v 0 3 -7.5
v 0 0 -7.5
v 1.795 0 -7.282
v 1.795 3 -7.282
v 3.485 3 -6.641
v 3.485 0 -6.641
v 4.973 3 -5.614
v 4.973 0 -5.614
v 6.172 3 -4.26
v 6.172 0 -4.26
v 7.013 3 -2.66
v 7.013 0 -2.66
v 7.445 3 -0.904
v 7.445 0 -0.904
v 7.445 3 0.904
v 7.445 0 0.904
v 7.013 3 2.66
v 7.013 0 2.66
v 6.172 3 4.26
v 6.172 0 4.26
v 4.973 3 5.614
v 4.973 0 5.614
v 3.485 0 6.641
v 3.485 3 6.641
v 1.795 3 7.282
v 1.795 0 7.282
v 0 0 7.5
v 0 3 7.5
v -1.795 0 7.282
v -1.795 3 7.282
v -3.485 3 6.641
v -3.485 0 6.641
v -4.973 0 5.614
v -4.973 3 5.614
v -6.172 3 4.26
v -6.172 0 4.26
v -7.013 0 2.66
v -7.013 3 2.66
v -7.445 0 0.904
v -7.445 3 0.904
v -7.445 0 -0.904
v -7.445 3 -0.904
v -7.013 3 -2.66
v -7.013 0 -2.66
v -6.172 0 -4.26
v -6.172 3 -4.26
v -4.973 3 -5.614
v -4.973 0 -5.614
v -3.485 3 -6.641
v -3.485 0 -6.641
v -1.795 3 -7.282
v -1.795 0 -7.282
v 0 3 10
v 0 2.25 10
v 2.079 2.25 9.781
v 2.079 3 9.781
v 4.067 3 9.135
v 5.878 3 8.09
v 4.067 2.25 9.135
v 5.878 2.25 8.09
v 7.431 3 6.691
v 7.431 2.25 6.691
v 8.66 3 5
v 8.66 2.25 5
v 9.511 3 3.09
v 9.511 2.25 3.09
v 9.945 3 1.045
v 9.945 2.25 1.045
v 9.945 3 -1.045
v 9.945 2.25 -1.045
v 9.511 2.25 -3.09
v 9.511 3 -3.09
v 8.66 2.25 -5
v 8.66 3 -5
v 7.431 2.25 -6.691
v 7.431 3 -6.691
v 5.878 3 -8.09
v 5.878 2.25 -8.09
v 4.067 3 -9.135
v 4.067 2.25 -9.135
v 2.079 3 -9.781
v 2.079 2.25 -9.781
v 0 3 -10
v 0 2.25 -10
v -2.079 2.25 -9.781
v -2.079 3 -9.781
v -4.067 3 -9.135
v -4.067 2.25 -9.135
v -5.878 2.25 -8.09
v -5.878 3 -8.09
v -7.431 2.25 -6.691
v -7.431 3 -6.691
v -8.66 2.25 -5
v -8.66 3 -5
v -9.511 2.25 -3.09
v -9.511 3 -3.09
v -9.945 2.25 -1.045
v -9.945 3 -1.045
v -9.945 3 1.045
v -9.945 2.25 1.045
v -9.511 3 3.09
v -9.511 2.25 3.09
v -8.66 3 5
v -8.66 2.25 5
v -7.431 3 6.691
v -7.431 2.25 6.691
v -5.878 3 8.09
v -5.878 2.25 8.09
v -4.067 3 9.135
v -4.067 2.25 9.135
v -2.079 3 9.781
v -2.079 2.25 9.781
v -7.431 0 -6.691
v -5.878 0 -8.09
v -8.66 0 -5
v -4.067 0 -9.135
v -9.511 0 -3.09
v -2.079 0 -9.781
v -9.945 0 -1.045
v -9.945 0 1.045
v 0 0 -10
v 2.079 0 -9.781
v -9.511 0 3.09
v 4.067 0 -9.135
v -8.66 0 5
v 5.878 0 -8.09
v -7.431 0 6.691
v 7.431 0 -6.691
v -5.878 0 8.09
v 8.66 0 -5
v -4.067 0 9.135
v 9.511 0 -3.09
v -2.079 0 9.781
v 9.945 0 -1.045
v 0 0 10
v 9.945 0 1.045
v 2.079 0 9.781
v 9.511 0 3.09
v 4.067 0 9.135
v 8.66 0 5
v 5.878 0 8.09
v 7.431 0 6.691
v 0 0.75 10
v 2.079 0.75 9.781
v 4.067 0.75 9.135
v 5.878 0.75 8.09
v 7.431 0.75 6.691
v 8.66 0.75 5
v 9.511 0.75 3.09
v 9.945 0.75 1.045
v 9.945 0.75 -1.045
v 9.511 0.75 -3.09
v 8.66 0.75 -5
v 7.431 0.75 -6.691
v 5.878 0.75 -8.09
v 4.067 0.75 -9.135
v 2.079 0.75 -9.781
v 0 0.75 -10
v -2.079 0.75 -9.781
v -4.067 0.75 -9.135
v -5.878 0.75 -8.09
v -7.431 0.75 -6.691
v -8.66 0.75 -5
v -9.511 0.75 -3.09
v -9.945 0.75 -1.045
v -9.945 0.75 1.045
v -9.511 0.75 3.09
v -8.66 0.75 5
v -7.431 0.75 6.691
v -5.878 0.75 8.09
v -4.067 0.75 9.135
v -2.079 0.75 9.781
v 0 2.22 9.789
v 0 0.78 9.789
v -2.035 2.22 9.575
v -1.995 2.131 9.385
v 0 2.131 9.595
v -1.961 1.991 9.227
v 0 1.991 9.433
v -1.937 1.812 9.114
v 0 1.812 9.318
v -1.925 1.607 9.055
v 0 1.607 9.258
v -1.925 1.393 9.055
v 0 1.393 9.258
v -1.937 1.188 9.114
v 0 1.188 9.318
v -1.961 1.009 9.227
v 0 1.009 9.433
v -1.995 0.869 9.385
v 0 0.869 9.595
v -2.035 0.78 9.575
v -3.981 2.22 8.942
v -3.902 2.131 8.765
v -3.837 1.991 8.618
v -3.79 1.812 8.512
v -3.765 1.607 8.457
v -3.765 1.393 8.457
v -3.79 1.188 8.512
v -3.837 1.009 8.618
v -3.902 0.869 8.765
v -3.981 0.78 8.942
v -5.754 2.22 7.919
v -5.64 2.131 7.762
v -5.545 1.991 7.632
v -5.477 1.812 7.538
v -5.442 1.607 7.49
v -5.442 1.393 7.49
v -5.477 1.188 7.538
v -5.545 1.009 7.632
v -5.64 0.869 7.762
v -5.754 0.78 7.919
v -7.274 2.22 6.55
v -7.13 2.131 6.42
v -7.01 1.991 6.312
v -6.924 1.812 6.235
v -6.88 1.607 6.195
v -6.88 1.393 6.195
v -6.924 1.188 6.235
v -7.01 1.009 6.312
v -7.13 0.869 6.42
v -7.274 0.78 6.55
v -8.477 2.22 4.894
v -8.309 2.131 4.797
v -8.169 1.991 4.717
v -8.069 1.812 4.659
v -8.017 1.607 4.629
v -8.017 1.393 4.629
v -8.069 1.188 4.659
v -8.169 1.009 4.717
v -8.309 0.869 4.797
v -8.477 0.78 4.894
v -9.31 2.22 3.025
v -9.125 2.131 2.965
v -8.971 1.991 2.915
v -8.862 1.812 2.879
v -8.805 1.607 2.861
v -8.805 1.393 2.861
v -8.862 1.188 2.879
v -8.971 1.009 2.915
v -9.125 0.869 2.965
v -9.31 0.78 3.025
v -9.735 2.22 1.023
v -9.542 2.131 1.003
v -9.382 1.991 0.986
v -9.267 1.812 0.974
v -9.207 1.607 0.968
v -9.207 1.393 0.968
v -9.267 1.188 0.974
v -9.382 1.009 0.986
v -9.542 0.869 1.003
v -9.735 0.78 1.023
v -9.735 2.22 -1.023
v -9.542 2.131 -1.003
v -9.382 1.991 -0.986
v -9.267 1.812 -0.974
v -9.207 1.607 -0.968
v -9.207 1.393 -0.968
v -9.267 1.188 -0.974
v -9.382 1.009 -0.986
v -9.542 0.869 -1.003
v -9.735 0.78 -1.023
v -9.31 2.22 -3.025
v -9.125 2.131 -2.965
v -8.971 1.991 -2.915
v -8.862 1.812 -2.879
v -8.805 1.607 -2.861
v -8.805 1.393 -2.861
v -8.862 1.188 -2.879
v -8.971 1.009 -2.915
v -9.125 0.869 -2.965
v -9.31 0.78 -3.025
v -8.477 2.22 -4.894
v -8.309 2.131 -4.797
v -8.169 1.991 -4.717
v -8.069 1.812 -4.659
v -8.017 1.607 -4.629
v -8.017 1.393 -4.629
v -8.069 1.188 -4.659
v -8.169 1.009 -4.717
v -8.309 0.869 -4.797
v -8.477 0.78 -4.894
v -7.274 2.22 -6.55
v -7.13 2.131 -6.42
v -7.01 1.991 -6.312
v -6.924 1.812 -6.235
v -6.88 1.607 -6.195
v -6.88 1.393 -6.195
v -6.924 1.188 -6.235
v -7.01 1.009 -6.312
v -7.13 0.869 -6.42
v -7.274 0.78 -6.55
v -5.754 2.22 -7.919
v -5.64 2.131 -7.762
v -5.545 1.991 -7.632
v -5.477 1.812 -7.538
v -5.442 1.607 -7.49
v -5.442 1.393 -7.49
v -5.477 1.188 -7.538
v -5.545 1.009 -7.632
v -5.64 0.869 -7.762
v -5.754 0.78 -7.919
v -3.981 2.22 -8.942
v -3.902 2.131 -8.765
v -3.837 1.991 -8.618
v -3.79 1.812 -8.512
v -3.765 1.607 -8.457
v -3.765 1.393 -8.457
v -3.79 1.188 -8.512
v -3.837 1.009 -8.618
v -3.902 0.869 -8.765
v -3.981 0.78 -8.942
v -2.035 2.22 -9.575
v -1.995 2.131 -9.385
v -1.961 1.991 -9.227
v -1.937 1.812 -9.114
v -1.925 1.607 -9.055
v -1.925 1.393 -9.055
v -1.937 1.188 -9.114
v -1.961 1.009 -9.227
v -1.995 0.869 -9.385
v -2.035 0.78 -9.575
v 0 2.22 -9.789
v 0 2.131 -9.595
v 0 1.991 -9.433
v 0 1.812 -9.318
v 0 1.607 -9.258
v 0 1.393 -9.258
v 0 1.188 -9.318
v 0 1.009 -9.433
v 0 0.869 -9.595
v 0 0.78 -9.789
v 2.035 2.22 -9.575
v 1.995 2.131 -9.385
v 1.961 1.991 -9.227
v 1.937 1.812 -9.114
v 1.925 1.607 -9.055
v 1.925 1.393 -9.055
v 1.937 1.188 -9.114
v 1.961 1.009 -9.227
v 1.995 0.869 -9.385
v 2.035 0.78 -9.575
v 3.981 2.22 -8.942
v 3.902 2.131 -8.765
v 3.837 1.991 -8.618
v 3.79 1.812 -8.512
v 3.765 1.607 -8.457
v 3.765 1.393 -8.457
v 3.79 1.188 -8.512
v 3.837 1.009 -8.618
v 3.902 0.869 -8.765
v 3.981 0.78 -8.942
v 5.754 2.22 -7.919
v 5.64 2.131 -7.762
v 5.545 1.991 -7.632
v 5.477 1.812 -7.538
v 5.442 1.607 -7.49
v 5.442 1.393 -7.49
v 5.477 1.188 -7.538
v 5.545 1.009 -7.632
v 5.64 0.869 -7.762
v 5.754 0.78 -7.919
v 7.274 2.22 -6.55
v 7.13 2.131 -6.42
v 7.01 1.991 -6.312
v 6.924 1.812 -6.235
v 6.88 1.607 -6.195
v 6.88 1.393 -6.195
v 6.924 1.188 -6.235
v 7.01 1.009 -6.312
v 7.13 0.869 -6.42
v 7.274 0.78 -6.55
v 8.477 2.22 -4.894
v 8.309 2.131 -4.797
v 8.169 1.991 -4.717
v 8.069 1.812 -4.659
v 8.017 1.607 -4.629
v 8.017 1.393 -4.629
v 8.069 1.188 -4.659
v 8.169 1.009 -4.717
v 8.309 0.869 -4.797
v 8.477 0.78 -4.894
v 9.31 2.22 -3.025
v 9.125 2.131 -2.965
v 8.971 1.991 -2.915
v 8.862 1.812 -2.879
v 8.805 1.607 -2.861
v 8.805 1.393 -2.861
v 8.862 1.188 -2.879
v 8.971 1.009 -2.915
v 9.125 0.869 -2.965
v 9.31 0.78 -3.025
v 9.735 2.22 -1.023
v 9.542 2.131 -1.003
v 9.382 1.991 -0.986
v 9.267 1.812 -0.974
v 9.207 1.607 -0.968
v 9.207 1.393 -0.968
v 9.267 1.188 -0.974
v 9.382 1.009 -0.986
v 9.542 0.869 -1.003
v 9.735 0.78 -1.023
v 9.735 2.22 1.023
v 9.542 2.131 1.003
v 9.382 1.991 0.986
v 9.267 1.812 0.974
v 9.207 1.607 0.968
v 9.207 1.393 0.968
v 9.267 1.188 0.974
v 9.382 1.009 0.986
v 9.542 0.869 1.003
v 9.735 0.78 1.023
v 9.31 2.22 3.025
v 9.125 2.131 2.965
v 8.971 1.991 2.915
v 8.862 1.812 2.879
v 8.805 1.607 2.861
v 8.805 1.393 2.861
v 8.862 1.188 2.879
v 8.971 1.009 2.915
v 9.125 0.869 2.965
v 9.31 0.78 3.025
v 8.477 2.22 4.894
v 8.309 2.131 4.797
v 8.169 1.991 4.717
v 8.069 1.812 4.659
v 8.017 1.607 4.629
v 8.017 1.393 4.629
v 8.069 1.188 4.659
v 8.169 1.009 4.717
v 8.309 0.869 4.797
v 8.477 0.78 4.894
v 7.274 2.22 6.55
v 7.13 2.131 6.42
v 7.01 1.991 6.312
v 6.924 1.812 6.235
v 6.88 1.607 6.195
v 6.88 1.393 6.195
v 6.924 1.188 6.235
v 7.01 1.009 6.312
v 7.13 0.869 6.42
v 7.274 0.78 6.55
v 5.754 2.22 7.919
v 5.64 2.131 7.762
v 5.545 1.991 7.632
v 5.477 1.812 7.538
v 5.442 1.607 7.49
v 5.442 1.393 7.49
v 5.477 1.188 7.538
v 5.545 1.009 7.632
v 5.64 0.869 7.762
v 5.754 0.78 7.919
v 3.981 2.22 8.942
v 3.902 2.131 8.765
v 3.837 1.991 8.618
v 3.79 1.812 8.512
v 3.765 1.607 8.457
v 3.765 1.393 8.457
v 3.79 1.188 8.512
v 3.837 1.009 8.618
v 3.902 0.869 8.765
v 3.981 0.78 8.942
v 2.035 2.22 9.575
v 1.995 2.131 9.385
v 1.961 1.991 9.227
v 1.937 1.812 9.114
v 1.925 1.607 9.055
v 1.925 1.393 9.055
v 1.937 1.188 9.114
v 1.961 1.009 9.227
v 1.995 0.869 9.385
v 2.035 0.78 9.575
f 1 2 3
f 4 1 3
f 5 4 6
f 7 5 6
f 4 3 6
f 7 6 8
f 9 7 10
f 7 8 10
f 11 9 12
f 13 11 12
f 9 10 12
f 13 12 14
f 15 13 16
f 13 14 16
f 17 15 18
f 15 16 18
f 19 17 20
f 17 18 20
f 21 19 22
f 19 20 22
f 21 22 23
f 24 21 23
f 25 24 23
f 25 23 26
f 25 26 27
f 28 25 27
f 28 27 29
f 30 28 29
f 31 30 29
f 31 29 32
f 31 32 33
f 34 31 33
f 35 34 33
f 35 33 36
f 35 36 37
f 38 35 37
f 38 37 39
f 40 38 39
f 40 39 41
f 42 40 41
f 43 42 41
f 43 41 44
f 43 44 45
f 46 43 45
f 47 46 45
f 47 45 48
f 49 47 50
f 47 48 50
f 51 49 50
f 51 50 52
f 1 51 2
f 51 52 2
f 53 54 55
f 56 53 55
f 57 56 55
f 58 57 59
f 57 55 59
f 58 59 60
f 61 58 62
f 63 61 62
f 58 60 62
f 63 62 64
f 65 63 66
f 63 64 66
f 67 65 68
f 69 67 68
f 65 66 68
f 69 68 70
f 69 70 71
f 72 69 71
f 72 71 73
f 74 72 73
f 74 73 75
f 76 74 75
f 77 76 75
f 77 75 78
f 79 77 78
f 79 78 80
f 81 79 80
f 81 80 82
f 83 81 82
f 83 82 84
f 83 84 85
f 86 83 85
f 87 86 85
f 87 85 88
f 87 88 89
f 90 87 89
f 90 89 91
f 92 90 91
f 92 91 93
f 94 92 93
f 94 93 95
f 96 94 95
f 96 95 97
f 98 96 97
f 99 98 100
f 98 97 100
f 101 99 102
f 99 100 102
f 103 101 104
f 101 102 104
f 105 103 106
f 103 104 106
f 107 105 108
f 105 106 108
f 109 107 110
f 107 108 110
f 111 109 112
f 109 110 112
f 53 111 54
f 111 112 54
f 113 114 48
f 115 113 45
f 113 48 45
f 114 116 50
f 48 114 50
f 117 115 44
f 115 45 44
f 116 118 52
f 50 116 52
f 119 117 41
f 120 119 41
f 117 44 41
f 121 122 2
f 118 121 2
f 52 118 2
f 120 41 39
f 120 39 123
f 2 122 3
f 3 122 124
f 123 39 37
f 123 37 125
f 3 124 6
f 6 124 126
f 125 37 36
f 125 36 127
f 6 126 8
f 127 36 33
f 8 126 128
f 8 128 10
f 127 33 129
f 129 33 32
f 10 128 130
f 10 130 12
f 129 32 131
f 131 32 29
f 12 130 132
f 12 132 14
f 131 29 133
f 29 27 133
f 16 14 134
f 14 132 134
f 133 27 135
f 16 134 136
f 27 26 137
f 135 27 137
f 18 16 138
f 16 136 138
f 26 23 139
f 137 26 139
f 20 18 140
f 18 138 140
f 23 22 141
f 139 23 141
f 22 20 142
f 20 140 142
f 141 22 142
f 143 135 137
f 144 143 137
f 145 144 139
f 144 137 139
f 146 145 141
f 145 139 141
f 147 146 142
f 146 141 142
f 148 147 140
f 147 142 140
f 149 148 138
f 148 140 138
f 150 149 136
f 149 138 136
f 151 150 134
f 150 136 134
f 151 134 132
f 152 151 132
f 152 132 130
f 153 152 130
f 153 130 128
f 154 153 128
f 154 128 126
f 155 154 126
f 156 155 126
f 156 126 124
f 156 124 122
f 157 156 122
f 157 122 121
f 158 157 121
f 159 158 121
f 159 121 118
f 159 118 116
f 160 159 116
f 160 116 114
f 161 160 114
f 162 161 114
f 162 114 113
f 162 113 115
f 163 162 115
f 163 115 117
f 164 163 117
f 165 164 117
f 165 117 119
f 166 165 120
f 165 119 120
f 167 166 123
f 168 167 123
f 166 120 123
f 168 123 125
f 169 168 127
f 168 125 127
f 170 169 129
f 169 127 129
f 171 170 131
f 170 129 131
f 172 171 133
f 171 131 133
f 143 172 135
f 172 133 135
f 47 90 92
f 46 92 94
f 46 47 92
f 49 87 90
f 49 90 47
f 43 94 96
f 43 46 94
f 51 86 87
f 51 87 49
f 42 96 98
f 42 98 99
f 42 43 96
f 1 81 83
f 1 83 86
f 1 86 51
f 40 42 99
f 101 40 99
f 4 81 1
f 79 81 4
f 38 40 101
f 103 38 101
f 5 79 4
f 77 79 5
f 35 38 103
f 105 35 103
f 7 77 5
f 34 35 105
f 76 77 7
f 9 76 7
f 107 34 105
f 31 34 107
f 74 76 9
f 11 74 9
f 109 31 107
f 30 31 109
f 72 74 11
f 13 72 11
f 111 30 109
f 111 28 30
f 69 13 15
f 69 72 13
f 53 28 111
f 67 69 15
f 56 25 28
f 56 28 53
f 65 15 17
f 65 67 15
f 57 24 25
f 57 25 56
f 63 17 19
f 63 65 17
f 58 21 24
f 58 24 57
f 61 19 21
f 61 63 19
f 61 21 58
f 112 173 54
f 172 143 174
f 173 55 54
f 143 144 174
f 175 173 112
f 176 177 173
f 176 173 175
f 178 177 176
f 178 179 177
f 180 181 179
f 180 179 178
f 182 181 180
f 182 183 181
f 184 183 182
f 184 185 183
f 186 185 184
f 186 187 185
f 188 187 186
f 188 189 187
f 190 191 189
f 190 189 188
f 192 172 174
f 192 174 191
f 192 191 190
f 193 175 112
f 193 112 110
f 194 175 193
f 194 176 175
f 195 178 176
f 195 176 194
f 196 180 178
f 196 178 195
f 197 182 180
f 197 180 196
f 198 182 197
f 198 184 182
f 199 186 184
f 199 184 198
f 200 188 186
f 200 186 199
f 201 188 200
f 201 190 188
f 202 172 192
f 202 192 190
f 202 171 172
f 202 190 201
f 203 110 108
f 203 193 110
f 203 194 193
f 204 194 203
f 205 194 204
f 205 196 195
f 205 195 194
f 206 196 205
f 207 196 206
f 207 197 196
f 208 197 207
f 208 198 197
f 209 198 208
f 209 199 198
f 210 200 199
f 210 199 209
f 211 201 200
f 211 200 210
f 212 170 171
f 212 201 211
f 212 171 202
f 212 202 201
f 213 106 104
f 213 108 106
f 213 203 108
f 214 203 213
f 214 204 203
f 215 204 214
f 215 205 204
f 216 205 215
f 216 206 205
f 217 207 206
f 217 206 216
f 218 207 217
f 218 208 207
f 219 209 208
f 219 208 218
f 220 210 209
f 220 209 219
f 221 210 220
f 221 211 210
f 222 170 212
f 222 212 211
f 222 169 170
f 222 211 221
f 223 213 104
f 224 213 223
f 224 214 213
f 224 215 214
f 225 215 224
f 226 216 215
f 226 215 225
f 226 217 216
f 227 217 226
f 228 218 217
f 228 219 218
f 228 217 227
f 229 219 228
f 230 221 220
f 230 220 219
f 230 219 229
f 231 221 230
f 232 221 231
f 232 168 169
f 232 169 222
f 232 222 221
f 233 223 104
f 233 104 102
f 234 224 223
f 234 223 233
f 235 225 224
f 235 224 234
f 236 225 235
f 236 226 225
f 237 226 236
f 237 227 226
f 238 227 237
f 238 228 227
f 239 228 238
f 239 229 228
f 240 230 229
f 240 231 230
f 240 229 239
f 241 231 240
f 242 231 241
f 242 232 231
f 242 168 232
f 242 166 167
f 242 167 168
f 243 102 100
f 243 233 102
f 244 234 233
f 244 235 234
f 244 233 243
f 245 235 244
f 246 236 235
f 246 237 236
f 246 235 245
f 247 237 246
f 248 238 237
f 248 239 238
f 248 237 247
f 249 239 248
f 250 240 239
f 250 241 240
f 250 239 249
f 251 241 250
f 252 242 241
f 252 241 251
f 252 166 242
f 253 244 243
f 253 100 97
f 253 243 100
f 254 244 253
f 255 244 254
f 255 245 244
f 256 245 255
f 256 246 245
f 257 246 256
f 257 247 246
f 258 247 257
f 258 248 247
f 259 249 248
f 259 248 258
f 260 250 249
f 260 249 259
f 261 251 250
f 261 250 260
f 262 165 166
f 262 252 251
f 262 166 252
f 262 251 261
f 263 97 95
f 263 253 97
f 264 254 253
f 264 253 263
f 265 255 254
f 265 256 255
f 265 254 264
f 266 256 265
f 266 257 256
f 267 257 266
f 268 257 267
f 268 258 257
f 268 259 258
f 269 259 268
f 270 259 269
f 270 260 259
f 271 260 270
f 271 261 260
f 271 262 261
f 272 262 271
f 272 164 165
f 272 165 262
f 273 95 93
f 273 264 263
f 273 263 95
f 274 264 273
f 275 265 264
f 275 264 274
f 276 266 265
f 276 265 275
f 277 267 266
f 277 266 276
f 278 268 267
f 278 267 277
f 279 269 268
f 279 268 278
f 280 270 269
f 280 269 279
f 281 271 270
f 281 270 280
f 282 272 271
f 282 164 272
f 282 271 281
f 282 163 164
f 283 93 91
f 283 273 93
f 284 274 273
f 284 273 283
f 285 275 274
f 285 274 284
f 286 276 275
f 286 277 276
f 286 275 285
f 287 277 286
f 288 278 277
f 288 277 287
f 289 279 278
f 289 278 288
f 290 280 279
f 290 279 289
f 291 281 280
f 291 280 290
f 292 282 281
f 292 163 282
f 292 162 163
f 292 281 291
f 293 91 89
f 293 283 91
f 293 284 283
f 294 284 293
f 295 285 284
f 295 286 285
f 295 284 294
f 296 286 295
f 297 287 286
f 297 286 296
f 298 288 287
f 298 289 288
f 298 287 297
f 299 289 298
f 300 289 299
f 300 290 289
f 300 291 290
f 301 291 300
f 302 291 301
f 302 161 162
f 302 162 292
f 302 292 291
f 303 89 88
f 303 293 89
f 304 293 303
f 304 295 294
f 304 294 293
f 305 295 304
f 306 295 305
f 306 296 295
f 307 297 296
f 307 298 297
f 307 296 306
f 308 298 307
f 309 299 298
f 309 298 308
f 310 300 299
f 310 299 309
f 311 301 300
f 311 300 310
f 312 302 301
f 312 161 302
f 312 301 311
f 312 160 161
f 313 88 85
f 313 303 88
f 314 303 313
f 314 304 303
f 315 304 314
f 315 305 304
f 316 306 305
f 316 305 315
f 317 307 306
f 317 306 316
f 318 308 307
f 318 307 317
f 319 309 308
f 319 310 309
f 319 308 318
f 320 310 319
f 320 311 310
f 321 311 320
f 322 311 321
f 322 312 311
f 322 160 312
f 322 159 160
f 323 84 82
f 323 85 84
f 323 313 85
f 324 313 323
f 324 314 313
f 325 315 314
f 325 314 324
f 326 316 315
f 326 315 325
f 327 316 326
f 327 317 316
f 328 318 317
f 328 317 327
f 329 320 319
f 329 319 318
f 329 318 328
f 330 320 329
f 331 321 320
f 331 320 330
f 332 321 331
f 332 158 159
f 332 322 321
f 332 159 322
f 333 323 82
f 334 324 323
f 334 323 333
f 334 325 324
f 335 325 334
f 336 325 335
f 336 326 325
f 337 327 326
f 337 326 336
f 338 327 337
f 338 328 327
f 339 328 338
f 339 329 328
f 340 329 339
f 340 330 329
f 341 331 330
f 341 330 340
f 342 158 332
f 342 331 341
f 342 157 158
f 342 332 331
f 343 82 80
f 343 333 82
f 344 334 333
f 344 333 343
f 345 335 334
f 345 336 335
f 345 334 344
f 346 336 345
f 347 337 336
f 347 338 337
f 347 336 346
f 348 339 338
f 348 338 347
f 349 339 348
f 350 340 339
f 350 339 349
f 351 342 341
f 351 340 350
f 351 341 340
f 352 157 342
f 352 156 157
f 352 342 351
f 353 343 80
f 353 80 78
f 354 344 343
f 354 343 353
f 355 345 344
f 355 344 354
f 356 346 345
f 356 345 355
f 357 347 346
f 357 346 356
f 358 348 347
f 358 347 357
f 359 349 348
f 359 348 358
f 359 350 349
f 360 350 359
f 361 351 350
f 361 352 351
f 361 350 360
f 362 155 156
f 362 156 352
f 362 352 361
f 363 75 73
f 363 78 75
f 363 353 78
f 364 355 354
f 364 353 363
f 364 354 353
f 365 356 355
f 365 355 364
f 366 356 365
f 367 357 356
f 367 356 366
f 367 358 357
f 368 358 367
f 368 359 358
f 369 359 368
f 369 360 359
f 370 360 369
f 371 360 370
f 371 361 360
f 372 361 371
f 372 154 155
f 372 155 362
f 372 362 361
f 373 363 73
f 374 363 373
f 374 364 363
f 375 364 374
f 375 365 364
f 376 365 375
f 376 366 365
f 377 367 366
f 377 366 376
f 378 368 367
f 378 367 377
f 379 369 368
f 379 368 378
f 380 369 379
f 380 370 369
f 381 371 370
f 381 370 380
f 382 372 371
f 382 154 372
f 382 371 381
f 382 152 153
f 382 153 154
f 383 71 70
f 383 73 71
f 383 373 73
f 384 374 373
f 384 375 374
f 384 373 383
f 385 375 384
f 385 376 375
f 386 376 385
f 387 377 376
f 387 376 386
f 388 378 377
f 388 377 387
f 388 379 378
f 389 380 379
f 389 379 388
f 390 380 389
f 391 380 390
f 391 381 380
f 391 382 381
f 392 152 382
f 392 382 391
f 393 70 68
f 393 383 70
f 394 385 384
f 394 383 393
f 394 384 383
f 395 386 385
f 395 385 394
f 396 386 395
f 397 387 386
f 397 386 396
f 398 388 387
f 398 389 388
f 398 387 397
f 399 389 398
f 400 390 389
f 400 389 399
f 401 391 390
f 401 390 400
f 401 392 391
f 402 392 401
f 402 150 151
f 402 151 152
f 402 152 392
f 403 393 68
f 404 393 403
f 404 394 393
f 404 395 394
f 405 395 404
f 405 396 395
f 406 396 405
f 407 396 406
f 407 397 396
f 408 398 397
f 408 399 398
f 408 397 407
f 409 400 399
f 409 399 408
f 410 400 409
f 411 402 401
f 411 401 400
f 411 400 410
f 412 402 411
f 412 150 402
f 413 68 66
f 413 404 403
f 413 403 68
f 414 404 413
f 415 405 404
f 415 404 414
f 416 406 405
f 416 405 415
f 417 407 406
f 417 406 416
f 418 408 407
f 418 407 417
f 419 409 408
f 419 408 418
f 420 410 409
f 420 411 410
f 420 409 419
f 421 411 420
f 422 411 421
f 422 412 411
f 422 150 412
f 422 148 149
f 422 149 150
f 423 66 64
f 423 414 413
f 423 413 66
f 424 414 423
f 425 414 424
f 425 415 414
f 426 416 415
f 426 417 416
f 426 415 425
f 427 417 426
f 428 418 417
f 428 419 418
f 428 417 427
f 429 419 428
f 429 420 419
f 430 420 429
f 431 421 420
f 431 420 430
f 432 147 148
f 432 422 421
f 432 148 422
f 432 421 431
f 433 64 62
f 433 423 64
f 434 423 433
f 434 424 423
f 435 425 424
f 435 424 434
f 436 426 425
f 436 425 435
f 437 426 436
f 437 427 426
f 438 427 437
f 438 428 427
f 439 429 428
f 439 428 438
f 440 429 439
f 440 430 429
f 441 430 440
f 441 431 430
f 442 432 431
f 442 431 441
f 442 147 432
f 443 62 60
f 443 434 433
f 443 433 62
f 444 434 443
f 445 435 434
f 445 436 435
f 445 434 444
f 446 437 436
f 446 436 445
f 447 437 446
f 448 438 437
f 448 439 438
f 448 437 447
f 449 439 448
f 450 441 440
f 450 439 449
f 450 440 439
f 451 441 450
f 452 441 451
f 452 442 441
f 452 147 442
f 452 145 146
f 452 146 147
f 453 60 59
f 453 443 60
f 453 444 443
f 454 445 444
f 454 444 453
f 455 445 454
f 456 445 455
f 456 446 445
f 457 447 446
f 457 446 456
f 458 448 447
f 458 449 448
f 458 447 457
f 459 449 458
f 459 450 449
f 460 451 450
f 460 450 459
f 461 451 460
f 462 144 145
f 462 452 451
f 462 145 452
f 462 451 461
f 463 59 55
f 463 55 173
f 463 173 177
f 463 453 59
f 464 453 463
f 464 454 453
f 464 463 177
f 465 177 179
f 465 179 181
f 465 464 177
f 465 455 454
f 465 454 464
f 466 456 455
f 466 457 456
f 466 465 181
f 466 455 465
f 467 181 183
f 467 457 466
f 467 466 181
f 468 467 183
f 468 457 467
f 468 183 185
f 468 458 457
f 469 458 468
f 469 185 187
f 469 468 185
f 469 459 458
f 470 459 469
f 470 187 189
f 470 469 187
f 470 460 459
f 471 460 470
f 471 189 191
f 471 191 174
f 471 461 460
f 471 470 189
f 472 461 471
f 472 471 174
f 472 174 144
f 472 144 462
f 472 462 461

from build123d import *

# Parameters (mm, degrees)
CROQUIS1_R              = 10
SALIENTE_EXTRUIR1_DEPTH = 3
CROQUIS2_R              = 0.75
CROQUIS4_R              = 7.5
CORTAR_EXTRUIR1_DEPTH   = 15.456832295


with BuildPart() as part:
    # Croquis1 → Saliente-Extruir1 (new body)
    with BuildSketch(Plane(origin=(0, 0, 0), x_dir=(1, 0, 0), z_dir=(0, 1, 0))):
        with Locations(Location((0, 0, 0), (0, 0, 270))):
            Circle(CROQUIS1_R)
    extrude(amount=SALIENTE_EXTRUIR1_DEPTH)

    # Croquis2 → Cortar-Revolución1 (revolve, cut)
    with BuildSketch(Plane(origin=(0, 0, 0), x_dir=(0, 0, -1), z_dir=(1, 0, 0)), mode=Mode.PRIVATE) as cortar_revoluci_n1_sk:
        with Locations((10, 1.5)):
            Circle(CROQUIS2_R)
    revolve(cortar_revoluci_n1_sk.sketch.rotate(Axis((0, 3, 0), (0, -1, 0)), 180), axis=Axis((0, 3, 0), (0, -1, 0)), mode=Mode.SUBTRACT)

    # Croquis4 → Cortar-Extruir1 (cut, through all)
    with BuildSketch(Plane.XZ):
        with Locations(Location((0, 0, 0), (0, 0, 270))):
            Circle(CROQUIS4_R)
    extrude(amount=-CORTAR_EXTRUIR1_DEPTH, mode=Mode.SUBTRACT)


solid = part.part
